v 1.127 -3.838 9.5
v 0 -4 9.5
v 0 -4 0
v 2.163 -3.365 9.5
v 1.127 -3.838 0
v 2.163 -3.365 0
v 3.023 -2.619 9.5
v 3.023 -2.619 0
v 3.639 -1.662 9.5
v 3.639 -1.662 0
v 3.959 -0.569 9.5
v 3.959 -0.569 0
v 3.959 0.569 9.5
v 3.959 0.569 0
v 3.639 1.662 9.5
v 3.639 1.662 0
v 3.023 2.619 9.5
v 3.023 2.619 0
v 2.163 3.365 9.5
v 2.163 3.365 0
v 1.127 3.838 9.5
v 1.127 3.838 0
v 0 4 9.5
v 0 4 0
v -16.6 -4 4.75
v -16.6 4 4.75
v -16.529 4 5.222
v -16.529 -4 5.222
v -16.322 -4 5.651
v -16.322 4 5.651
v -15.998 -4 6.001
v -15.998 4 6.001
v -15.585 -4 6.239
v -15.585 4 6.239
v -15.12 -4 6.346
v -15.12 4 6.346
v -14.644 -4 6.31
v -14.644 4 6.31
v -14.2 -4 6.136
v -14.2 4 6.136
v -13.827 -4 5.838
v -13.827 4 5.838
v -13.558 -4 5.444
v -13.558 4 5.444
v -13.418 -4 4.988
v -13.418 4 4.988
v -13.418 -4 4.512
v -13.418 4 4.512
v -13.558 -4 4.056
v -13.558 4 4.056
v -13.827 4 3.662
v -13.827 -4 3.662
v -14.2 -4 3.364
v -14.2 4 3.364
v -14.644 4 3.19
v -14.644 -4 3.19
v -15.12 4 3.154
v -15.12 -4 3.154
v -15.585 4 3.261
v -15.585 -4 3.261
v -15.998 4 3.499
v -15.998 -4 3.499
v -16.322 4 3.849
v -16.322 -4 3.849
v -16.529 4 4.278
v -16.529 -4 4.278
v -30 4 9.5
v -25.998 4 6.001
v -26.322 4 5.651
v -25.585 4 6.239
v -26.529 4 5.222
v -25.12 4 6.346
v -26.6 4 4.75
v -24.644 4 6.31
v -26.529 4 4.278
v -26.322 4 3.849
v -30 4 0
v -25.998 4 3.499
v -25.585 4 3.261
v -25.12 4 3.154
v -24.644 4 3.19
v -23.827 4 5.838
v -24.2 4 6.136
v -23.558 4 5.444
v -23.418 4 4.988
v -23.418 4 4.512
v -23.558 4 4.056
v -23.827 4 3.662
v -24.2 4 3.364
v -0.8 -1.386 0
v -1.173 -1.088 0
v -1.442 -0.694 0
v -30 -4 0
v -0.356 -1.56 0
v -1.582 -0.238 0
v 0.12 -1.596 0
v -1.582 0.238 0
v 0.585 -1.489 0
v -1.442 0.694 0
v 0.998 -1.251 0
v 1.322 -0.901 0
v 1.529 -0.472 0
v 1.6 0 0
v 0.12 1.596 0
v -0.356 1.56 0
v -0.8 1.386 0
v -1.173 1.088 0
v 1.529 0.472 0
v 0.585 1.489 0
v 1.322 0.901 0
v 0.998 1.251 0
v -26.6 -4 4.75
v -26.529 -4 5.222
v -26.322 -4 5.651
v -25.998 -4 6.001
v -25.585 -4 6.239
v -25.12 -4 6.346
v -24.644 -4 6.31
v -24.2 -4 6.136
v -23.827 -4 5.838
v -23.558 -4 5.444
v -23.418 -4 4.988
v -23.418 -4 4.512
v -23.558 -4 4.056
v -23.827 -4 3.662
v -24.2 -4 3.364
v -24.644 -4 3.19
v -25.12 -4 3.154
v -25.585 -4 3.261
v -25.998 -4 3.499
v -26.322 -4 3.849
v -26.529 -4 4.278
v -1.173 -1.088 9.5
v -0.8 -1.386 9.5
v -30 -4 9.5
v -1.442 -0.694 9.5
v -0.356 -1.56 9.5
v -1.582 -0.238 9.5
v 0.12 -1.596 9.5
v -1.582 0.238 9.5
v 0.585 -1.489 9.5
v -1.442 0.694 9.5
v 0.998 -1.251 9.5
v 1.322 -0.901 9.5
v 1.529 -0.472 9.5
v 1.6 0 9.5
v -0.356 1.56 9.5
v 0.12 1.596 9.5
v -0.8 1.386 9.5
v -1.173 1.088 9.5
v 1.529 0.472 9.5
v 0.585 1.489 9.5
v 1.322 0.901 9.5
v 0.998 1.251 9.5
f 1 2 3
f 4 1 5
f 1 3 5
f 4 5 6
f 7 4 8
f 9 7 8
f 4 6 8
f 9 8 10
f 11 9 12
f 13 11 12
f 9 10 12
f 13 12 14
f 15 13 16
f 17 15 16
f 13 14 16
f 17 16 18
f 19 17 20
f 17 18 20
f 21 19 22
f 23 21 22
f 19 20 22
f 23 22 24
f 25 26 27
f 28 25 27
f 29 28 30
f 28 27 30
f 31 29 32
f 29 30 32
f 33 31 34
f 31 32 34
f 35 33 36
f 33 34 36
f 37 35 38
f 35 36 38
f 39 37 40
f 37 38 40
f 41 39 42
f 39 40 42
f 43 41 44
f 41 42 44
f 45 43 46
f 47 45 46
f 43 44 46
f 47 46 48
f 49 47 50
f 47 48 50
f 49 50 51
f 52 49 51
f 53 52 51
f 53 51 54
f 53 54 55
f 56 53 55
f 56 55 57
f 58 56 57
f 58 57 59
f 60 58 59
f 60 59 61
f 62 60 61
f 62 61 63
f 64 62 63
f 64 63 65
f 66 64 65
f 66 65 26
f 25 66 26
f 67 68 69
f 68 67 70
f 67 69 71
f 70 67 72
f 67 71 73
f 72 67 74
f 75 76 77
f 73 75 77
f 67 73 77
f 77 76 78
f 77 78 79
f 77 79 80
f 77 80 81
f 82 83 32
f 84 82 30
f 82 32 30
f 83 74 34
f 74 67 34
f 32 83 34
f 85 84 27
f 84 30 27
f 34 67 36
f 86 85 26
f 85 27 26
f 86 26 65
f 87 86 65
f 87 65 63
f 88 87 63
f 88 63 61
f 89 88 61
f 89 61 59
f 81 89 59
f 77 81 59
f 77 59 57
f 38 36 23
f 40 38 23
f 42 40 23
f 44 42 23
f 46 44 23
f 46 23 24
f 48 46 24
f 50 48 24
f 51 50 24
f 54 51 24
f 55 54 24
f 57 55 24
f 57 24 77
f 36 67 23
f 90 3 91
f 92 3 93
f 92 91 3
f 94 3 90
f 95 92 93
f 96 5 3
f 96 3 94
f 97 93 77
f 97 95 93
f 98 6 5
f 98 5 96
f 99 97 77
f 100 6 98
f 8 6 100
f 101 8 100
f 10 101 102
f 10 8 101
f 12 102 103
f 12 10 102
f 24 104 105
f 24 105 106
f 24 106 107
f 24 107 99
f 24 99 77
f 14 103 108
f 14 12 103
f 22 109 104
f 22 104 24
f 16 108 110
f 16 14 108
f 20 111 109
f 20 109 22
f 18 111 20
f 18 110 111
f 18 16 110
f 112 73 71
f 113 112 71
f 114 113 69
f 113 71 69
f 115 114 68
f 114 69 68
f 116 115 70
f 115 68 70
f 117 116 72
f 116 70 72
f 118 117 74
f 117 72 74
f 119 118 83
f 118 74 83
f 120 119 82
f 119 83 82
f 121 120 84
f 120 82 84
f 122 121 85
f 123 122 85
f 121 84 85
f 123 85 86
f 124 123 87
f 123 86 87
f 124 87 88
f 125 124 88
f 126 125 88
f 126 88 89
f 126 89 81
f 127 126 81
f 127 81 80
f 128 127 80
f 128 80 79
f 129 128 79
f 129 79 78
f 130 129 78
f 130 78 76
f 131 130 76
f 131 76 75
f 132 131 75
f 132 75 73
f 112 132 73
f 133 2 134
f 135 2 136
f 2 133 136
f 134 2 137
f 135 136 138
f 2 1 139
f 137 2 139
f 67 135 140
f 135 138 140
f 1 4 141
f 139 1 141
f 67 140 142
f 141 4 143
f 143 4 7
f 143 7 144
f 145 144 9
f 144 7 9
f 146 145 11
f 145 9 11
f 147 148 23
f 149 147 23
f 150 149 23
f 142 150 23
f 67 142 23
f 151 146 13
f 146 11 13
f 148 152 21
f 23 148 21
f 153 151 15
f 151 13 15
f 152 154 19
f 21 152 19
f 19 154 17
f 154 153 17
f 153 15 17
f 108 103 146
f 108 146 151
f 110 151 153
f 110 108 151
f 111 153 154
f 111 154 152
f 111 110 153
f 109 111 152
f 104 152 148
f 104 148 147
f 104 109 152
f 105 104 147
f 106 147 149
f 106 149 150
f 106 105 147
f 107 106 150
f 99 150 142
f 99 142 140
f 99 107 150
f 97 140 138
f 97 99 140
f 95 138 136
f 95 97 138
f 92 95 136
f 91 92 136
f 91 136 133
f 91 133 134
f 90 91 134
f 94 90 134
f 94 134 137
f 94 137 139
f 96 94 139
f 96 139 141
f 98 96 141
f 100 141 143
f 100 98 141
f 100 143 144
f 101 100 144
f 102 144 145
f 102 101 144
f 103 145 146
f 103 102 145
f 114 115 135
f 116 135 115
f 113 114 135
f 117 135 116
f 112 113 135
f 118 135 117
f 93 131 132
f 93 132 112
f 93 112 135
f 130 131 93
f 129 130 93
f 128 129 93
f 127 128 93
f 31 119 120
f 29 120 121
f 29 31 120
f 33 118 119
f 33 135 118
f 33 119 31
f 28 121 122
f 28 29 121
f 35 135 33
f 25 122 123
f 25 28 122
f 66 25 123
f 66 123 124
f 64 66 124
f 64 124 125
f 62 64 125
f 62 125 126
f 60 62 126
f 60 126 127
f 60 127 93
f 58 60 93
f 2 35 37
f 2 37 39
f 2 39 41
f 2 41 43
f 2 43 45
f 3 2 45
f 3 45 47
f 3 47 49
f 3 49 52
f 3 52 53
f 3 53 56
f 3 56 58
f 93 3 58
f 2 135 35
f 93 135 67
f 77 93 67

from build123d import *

# Parameters (mm, degrees)
SKETCH_R        = 1.6
PAD_DEPTH       = 9.5
SKETCH001_R     = 1.6
POCKET_DEPTH    = 8.001
POCKET_FACE6_W  = 8
POCKET_FACE6_H  = 9.5
PAD001_DEPTH    = 10
SKETCH002_R     = 1.6
POCKET001_DEPTH = 8.001


with BuildPart() as part:
    # Sketch → Pad (new body)
    with BuildSketch(Plane.XY):
        with BuildLine():
            ThreePointArc((0, -4), (4, 0), (0, 4))
            Line((0, 4), (-20, 4))
            Line((-20, 4), (-20, -4))
            Line((-20, -4), (0, -4))
        make_face()
        Circle(SKETCH_R, mode=Mode.SUBTRACT)
    extrude(amount=PAD_DEPTH)

    # Sketch001 (on Face2 of Pad) → Pocket (cut, through all)
    with BuildSketch(Plane(origin=(0, 4, 0), x_dir=(-1, 0, 0), z_dir=(0, 1, 0))):
        with Locations((15, 4.75)):
            Circle(SKETCH001_R)
    extrude(amount=-POCKET_DEPTH, mode=Mode.SUBTRACT)

    # Pocket Face6 → Pad001 (add)
    with BuildSketch(Plane(origin=(-20, 0, 4.75), x_dir=(0, 1, 0), z_dir=(-1, 0, 0))):
        Rectangle(POCKET_FACE6_W, POCKET_FACE6_H)
    extrude(amount=PAD001_DEPTH)

    # Sketch002 (on Face8 of Pad001) → Pocket001 (cut, through all)
    with BuildSketch(Plane(origin=(0, 4, 0), x_dir=(-1, 0, 0), z_dir=(0, 1, 0))):
        with Locations((25, 4.75)):
            Circle(SKETCH002_R)
    extrude(amount=-POCKET001_DEPTH, mode=Mode.SUBTRACT)


solid = part.part
